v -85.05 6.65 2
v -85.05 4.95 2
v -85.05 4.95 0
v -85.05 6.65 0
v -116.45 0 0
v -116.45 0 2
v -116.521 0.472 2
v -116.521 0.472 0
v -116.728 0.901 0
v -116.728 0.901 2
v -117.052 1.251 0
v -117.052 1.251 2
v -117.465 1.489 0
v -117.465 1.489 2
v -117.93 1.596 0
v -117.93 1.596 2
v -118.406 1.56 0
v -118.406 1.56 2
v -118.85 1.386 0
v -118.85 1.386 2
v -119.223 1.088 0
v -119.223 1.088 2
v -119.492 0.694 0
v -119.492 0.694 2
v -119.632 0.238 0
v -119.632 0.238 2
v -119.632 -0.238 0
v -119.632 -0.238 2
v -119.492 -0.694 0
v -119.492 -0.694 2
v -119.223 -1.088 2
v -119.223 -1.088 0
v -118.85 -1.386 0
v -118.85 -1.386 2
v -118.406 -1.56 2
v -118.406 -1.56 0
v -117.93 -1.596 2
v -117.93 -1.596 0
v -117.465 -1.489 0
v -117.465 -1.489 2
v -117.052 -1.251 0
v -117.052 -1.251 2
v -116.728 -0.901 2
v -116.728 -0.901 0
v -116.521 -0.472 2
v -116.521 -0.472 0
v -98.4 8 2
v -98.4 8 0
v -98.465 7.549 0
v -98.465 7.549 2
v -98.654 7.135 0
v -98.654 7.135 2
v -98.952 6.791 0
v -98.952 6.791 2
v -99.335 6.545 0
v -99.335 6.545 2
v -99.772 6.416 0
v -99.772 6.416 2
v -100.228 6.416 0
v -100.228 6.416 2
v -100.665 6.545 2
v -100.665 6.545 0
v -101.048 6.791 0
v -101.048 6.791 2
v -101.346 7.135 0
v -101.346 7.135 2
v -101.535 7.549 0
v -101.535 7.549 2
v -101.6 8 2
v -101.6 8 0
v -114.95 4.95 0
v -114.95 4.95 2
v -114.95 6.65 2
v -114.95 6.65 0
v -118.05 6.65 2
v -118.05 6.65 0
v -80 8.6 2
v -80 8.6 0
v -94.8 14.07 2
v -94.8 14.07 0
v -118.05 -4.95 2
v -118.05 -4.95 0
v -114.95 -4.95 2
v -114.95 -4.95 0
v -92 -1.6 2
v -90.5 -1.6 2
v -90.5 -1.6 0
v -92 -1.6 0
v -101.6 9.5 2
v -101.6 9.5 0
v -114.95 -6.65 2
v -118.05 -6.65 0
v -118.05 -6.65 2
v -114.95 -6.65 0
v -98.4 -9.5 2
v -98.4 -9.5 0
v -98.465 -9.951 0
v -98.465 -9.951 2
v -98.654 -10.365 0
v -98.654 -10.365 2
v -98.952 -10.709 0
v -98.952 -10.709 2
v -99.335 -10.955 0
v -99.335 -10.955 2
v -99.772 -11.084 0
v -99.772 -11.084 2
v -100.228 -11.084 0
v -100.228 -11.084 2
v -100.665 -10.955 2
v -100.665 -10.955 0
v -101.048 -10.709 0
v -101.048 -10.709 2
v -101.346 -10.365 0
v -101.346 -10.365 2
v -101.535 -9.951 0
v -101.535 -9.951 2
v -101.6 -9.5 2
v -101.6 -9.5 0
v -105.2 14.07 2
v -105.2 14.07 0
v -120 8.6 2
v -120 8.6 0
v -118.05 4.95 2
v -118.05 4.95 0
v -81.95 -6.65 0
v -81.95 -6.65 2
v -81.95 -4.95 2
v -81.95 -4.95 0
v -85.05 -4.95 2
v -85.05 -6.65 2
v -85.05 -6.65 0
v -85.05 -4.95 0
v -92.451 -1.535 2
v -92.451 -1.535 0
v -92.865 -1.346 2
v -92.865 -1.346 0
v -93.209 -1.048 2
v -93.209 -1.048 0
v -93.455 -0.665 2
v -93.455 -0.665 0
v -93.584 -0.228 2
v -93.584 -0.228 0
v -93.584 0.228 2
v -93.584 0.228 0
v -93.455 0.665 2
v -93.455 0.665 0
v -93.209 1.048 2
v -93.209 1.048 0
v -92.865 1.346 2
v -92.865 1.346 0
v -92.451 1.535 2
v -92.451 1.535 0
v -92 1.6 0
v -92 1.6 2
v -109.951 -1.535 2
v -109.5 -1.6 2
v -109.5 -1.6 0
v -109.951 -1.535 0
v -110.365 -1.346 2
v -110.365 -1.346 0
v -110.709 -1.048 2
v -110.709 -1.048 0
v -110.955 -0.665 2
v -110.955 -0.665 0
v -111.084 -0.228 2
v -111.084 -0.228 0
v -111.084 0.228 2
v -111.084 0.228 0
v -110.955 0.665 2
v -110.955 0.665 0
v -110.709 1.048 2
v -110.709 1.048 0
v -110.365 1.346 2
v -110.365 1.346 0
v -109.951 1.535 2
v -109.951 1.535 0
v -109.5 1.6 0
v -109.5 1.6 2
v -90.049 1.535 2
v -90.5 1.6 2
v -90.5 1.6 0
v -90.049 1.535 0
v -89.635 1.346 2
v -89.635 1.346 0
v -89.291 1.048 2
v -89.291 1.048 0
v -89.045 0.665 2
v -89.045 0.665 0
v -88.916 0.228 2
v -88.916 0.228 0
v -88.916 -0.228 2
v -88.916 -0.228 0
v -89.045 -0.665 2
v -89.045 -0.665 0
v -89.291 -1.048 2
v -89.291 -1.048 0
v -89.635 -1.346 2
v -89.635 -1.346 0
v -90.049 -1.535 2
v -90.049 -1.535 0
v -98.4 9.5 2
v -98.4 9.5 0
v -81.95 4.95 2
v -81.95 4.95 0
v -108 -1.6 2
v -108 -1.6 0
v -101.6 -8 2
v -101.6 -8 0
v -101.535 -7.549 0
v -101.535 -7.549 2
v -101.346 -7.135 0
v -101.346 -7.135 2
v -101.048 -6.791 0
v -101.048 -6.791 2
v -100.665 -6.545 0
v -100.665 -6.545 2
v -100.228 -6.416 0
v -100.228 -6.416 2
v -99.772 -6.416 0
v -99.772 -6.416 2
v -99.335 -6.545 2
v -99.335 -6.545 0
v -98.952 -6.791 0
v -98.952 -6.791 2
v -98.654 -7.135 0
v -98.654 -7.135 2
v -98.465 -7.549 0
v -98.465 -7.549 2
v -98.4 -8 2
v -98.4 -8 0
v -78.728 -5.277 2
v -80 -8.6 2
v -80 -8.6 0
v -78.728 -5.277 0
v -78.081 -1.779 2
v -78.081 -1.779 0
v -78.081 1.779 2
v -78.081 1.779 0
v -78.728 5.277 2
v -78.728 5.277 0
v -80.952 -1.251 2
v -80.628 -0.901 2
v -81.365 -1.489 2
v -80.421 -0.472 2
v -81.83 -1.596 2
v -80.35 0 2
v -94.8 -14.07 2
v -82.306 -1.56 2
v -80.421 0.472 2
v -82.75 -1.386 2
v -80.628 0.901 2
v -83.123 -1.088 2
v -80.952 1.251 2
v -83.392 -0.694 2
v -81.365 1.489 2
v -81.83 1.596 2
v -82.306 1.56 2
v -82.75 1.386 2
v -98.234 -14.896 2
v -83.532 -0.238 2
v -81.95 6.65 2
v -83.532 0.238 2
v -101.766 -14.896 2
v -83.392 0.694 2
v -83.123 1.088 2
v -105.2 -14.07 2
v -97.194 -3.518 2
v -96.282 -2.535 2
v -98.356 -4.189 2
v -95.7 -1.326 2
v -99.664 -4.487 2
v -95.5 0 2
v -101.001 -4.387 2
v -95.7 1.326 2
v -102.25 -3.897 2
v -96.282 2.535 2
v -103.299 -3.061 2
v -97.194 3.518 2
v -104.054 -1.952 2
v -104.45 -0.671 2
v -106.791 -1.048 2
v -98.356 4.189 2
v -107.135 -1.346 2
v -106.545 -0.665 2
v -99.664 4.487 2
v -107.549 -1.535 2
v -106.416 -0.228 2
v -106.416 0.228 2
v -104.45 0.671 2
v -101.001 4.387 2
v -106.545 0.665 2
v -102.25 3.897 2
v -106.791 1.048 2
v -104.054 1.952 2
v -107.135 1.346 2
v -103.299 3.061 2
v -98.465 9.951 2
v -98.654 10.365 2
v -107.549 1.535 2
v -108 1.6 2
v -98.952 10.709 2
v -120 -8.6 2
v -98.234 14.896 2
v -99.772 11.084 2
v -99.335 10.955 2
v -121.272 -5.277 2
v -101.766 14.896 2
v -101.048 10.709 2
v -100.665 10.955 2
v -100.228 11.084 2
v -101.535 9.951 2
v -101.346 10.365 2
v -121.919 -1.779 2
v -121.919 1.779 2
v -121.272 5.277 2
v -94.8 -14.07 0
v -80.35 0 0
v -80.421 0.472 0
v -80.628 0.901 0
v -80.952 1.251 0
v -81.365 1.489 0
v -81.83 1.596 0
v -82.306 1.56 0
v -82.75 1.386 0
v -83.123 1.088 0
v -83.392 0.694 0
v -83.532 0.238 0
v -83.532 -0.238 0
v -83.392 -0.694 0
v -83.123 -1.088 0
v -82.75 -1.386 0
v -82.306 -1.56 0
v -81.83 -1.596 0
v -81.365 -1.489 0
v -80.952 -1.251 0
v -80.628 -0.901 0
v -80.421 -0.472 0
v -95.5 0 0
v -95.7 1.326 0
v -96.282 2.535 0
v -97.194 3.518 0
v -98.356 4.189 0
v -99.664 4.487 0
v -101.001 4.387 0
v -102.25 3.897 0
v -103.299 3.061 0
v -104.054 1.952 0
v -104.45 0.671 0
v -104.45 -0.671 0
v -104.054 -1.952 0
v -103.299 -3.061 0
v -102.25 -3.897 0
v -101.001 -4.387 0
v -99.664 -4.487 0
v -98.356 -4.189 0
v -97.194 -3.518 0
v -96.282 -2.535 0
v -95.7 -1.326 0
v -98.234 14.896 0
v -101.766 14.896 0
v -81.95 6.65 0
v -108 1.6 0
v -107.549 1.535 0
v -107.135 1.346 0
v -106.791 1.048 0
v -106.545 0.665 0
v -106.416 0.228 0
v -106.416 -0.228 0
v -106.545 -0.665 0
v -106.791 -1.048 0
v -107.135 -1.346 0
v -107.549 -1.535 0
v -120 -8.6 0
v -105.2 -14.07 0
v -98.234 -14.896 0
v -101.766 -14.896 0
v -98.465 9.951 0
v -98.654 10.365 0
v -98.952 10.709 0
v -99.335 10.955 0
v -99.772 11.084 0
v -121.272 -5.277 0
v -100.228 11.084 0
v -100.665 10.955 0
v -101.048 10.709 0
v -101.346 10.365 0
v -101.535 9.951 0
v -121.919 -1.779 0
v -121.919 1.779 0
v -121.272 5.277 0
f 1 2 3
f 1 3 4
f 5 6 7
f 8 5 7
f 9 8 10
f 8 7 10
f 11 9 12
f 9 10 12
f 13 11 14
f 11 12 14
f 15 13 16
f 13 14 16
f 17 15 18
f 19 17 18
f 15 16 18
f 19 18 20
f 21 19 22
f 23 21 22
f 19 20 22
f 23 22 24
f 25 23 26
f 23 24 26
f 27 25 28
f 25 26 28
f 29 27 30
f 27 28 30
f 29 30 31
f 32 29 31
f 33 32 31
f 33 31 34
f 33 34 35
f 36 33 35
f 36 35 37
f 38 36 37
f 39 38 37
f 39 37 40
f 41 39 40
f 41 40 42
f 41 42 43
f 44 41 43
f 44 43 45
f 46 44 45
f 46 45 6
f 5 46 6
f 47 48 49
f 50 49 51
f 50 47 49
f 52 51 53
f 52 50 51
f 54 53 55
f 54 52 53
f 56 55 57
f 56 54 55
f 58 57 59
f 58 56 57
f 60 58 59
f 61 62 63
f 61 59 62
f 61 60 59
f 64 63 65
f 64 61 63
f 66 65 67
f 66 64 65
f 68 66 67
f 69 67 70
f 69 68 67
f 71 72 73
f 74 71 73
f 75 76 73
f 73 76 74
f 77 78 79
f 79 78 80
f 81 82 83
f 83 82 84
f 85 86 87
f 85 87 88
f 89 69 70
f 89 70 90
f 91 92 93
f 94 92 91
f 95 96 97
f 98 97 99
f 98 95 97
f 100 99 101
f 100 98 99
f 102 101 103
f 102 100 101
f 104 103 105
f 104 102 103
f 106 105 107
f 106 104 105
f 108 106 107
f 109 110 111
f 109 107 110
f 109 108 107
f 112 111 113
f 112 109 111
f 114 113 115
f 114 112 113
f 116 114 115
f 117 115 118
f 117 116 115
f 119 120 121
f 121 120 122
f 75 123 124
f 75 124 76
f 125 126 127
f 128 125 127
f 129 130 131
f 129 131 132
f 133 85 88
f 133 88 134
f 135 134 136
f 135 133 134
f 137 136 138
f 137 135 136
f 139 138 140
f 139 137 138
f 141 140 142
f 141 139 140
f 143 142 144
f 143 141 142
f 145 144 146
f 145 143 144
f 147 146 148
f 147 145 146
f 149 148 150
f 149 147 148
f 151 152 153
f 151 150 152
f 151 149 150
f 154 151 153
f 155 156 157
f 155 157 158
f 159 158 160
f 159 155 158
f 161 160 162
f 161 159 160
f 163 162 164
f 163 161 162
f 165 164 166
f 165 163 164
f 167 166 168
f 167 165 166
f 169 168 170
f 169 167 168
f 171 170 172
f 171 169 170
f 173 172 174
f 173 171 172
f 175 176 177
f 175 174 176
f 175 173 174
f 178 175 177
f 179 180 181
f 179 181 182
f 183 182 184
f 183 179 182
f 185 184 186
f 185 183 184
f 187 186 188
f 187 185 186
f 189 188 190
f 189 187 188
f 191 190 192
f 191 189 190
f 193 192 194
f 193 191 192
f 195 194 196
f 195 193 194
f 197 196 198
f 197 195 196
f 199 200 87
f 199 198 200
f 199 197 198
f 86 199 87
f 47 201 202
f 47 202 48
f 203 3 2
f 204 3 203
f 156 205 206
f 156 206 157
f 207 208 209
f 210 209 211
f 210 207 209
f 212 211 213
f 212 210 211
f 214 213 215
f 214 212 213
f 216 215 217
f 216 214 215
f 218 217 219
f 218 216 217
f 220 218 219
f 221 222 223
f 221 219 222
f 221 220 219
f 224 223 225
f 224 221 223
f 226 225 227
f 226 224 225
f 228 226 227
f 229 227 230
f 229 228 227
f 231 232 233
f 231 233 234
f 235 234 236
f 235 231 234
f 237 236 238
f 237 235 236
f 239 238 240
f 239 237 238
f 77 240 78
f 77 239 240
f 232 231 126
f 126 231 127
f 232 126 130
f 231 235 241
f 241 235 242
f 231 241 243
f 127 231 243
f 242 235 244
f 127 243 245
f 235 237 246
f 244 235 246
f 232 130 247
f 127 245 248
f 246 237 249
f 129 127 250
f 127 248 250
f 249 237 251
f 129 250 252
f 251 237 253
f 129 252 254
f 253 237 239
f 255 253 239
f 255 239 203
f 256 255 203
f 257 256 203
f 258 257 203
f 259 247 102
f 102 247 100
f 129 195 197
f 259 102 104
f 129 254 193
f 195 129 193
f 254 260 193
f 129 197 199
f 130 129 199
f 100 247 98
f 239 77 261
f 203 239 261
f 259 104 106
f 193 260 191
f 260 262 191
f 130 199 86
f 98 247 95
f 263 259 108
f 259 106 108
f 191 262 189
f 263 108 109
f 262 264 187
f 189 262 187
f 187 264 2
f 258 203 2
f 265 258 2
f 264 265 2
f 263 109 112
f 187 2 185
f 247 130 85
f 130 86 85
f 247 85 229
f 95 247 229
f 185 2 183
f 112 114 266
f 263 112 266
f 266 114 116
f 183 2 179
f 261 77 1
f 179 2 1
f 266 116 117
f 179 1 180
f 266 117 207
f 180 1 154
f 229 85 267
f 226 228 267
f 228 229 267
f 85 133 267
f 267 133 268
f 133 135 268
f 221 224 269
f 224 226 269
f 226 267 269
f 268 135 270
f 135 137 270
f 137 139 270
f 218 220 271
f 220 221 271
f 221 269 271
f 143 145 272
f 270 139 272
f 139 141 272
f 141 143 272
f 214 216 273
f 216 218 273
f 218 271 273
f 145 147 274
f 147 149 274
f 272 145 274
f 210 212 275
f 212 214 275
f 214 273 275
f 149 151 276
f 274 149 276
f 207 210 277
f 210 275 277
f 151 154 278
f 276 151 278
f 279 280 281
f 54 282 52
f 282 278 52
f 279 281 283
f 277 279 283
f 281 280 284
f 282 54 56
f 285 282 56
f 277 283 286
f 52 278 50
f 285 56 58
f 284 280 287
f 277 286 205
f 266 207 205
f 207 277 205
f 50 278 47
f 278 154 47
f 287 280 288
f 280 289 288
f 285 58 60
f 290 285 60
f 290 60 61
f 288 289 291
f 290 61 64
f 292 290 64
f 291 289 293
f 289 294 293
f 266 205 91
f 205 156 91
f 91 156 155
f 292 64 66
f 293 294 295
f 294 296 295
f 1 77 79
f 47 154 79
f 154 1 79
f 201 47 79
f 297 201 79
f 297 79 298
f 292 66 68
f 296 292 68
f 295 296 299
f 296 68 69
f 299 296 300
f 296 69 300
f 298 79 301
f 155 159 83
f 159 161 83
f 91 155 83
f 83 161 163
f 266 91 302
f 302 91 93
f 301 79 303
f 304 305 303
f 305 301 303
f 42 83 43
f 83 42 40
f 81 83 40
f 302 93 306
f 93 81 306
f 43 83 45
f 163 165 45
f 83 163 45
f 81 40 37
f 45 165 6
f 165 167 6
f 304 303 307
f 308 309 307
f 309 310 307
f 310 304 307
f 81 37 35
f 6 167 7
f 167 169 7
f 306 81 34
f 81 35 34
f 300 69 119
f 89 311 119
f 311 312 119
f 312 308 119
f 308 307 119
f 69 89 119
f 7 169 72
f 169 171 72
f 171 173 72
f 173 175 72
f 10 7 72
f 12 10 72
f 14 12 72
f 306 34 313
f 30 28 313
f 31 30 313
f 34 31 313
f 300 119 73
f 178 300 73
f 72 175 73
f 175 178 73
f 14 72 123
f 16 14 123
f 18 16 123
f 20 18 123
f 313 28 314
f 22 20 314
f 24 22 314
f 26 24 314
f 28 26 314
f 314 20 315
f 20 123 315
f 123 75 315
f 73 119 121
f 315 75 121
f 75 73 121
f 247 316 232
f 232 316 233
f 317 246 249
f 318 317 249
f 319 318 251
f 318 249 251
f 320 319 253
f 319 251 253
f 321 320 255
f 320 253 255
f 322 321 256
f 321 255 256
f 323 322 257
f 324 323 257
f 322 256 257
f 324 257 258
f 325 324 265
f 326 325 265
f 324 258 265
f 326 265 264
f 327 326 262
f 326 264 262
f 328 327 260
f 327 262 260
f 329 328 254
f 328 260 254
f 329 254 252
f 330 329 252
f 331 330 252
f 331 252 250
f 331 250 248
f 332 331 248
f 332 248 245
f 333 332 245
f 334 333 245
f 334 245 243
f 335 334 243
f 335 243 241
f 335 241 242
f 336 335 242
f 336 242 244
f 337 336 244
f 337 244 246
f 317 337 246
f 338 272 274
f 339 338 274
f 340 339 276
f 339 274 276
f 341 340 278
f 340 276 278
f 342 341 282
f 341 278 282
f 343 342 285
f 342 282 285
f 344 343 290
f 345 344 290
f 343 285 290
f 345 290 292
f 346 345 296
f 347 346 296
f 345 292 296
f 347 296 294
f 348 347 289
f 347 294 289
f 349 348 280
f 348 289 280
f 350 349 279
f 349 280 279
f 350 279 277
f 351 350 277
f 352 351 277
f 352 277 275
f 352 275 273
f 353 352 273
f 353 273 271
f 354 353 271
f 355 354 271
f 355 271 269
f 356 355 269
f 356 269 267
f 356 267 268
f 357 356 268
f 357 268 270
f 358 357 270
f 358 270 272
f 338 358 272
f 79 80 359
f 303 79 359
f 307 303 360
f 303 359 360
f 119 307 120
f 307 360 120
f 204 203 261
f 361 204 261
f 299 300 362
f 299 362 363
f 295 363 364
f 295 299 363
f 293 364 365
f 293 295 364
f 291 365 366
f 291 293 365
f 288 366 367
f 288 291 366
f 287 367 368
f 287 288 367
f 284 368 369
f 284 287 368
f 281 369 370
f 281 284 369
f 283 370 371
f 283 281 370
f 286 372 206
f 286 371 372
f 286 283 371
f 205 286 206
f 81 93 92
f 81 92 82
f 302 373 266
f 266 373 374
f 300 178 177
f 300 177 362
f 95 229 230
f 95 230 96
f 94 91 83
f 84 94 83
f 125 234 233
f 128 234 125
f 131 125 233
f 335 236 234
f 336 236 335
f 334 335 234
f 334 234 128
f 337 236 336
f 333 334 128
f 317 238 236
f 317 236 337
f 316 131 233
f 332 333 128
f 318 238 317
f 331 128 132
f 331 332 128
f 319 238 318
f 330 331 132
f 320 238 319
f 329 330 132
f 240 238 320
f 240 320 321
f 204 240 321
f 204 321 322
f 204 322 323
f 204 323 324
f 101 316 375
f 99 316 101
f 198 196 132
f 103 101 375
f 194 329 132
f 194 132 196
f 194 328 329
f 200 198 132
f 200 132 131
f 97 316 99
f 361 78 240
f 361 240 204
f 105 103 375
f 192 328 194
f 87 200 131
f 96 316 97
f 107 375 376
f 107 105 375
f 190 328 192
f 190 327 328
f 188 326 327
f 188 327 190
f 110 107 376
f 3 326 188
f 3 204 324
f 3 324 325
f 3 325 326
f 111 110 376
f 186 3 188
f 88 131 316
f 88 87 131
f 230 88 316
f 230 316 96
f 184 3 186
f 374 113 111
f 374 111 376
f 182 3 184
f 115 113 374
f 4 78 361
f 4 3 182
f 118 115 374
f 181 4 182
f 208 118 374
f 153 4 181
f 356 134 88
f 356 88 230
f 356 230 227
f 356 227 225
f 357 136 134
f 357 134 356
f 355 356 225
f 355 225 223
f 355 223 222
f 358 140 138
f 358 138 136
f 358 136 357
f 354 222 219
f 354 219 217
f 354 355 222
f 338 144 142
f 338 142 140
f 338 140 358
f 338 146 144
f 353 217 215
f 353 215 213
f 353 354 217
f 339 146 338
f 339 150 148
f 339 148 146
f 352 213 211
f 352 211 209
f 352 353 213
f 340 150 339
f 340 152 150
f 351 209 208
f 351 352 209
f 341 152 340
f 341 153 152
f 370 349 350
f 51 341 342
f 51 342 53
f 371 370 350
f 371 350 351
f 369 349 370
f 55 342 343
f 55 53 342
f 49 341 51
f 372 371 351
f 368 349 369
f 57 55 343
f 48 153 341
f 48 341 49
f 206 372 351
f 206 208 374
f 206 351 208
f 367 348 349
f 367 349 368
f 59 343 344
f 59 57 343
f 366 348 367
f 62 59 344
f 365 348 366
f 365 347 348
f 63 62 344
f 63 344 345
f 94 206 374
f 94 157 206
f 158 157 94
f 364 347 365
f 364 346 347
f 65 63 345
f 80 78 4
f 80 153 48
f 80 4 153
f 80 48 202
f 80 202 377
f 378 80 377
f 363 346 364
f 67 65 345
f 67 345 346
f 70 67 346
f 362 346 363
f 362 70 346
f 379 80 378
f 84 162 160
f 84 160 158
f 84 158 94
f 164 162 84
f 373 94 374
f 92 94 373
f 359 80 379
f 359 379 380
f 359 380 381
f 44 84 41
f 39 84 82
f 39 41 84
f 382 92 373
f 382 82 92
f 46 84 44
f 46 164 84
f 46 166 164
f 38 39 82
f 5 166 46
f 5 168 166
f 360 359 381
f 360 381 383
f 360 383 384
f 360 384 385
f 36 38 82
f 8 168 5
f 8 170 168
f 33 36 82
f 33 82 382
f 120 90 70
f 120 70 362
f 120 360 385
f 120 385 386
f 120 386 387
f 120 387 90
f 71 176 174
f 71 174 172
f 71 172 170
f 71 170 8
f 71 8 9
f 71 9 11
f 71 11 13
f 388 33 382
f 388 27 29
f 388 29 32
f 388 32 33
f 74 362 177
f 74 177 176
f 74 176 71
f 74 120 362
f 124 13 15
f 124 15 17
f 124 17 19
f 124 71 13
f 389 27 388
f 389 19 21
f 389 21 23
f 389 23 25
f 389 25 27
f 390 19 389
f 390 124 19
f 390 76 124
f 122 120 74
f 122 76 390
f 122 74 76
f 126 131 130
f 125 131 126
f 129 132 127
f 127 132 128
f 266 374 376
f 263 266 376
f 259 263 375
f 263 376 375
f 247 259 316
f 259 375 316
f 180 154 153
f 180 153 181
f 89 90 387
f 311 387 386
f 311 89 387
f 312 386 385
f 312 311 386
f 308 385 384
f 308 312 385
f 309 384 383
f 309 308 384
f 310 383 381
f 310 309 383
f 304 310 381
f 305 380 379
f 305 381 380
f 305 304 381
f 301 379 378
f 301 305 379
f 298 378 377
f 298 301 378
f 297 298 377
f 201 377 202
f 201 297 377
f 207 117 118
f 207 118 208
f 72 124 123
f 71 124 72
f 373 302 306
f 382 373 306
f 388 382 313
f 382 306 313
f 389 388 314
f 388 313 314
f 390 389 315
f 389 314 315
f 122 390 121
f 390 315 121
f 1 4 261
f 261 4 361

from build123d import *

# Parameters (mm, degrees)
SKETCH1_W           = 3.1
SKETCH1_H           = 1.7
BOSS_EXTRUDE1_DEPTH = 2
CUT_EXTRUDE1_REACH  = 122.95
SKETCH2_R           = 4.5
BOSS_EXTRUDE2_DEPTH = 2
CUT_EXTRUDE2_REACH  = 124.935
SKETCH3_R           = 1.6


with BuildPart() as part:
    # Sketch1 → Boss-Extrude1 (new body)
    with BuildSketch(Plane.XY):
        with BuildLine():
            Line((-105.199970129, 14.069836909), (-120, 8.6))
            Line((-120, 8.6), (-120, -8.6))
            Line((-120, -8.6), (-105.199970129, -14.069836909))
            ThreePointArc((-105.199970129, -14.069836909), (-100, -15), (-94.800029871, -14.069836909))
            Line((-94.800029871, -14.069836909), (-80, -8.6))
            Line((-80, -8.6), (-80, 8.6))
            Line((-80, 8.6), (-94.800029871, 14.069836909))
            ThreePointArc((-94.800029871, 14.069836909), (-100, 15), (-105.199970129, 14.069836909))
        make_face()
        with Locations((-116.5, 5.8)):
            Rectangle(SKETCH1_W, SKETCH1_H, mode=Mode.SUBTRACT)
        with Locations((-83.5, 5.8)):
            Rectangle(SKETCH1_W, SKETCH1_H, mode=Mode.SUBTRACT)
        with Locations((-116.5, -5.8)):
            Rectangle(SKETCH1_W, SKETCH1_H, mode=Mode.SUBTRACT)
        with Locations((-83.5, -5.8)):
            Rectangle(SKETCH1_W, SKETCH1_H, mode=Mode.SUBTRACT)
    extrude(amount=BOSS_EXTRUDE1_DEPTH)

    # Sketch2 → Cut-Extrude1 (cut, up to next)
    with BuildSketch(Plane.XY.offset(2), mode=Mode.PRIVATE) as cut_extrude1_sk1:
        with Locations((-100, 0)):
            Circle(SKETCH2_R)
    cut_extrude1_tool1 = extrude(cut_extrude1_sk1.sketch, amount=-CUT_EXTRUDE1_REACH, mode=Mode.PRIVATE) & part.part
    # Sketch2 → Cut-Extrude1 (cut, up to next)
    with BuildSketch(Plane.XY.offset(2), mode=Mode.PRIVATE) as cut_extrude1_sk2:
        with BuildLine():
            Line((-108, -1.6), (-109.5, -1.6))
            ThreePointArc((-109.5, -1.6), (-111.1, 0), (-109.5, 1.6))
            Line((-109.5, 1.6), (-108, 1.6))
            ThreePointArc((-108, 1.6), (-106.4, 0), (-108, -1.6))
        make_face()
    cut_extrude1_tool2 = extrude(cut_extrude1_sk2.sketch, amount=-CUT_EXTRUDE1_REACH, mode=Mode.PRIVATE) & part.part
    # Sketch2 → Cut-Extrude1 (cut, up to next)
    with BuildSketch(Plane.XY.offset(2), mode=Mode.PRIVATE) as cut_extrude1_sk3:
        with BuildLine():
            Line((-101.6, 8), (-101.6, 9.5))
            ThreePointArc((-101.6, 9.5), (-100, 11.1), (-98.4, 9.5))
            Line((-98.4, 9.5), (-98.4, 8))
            ThreePointArc((-98.4, 8), (-100, 6.4), (-101.6, 8))
        make_face()
    cut_extrude1_tool3 = extrude(cut_extrude1_sk3.sketch, amount=-CUT_EXTRUDE1_REACH, mode=Mode.PRIVATE) & part.part
    # Sketch2 → Cut-Extrude1 (cut, up to next)
    with BuildSketch(Plane.XY.offset(2), mode=Mode.PRIVATE) as cut_extrude1_sk4:
        with BuildLine():
            Line((-92, 1.6), (-90.5, 1.6))
            ThreePointArc((-90.5, 1.6), (-88.9, 0), (-90.5, -1.6))
            Line((-90.5, -1.6), (-92, -1.6))
            ThreePointArc((-92, -1.6), (-93.6, 0), (-92, 1.6))
        make_face()
    cut_extrude1_tool4 = extrude(cut_extrude1_sk4.sketch, amount=-CUT_EXTRUDE1_REACH, mode=Mode.PRIVATE) & part.part
    # Sketch2 → Cut-Extrude1 (cut, up to next)
    with BuildSketch(Plane.XY.offset(2), mode=Mode.PRIVATE) as cut_extrude1_sk5:
        with BuildLine():
            Line((-98.4, -8), (-98.4, -9.5))
            ThreePointArc((-98.4, -9.5), (-100, -11.1), (-101.6, -9.5))
            Line((-101.6, -9.5), (-101.6, -8))
            ThreePointArc((-101.6, -8), (-100, -6.4), (-98.4, -8))
        make_face()
    cut_extrude1_tool5 = extrude(cut_extrude1_sk5.sketch, amount=-CUT_EXTRUDE1_REACH, mode=Mode.PRIVATE) & part.part
    add(cut_extrude1_tool1.solids().sort_by_distance((-100, 0, 2))[0], mode=Mode.SUBTRACT)
    add(cut_extrude1_tool2.solids().sort_by_distance((-108.75, 0, 2))[0], mode=Mode.SUBTRACT)
    add(cut_extrude1_tool3.solids().sort_by_distance((-100, 8.75, 2))[0], mode=Mode.SUBTRACT)
    add(cut_extrude1_tool4.solids().sort_by_distance((-91.25, 0, 2))[0], mode=Mode.SUBTRACT)
    add(cut_extrude1_tool5.solids().sort_by_distance((-100, -8.75, 2))[0], mode=Mode.SUBTRACT)

    # Sketch5 → Boss-Extrude2 (add)
    with BuildSketch(Plane.XY.offset(2)):
        with BuildLine():
            Line((-120, 8.6), (-120, -8.6))
            ThreePointArc((-120, -8.6), (-122, 0), (-120, 8.6))
        make_face()
        with BuildLine():
            Line((-80, 8.6), (-80, -8.6))
            ThreePointArc((-80, -8.6), (-78, 0), (-80, 8.6))
        make_face()
    extrude(amount=-BOSS_EXTRUDE2_DEPTH)

    # Sketch3 → Cut-Extrude2 (cut, up to next)
    with BuildSketch(Plane.XY.offset(2), mode=Mode.PRIVATE) as cut_extrude2_sk1:
        with Locations((-118.05, 0)):
            Circle(SKETCH3_R)
    cut_extrude2_tool1 = extrude(cut_extrude2_sk1.sketch, amount=-CUT_EXTRUDE2_REACH, mode=Mode.PRIVATE) & part.part
    # Sketch3 → Cut-Extrude2 (cut, up to next)
    with BuildSketch(Plane.XY.offset(2), mode=Mode.PRIVATE) as cut_extrude2_sk2:
        with Locations((-81.95, 0)):
            Circle(SKETCH3_R)
    cut_extrude2_tool2 = extrude(cut_extrude2_sk2.sketch, amount=-CUT_EXTRUDE2_REACH, mode=Mode.PRIVATE) & part.part
    add(cut_extrude2_tool1.solids().sort_by_distance((-118.05, 0, 2))[0], mode=Mode.SUBTRACT)
    add(cut_extrude2_tool2.solids().sort_by_distance((-81.95, 0, 2))[0], mode=Mode.SUBTRACT)


solid = part.part
